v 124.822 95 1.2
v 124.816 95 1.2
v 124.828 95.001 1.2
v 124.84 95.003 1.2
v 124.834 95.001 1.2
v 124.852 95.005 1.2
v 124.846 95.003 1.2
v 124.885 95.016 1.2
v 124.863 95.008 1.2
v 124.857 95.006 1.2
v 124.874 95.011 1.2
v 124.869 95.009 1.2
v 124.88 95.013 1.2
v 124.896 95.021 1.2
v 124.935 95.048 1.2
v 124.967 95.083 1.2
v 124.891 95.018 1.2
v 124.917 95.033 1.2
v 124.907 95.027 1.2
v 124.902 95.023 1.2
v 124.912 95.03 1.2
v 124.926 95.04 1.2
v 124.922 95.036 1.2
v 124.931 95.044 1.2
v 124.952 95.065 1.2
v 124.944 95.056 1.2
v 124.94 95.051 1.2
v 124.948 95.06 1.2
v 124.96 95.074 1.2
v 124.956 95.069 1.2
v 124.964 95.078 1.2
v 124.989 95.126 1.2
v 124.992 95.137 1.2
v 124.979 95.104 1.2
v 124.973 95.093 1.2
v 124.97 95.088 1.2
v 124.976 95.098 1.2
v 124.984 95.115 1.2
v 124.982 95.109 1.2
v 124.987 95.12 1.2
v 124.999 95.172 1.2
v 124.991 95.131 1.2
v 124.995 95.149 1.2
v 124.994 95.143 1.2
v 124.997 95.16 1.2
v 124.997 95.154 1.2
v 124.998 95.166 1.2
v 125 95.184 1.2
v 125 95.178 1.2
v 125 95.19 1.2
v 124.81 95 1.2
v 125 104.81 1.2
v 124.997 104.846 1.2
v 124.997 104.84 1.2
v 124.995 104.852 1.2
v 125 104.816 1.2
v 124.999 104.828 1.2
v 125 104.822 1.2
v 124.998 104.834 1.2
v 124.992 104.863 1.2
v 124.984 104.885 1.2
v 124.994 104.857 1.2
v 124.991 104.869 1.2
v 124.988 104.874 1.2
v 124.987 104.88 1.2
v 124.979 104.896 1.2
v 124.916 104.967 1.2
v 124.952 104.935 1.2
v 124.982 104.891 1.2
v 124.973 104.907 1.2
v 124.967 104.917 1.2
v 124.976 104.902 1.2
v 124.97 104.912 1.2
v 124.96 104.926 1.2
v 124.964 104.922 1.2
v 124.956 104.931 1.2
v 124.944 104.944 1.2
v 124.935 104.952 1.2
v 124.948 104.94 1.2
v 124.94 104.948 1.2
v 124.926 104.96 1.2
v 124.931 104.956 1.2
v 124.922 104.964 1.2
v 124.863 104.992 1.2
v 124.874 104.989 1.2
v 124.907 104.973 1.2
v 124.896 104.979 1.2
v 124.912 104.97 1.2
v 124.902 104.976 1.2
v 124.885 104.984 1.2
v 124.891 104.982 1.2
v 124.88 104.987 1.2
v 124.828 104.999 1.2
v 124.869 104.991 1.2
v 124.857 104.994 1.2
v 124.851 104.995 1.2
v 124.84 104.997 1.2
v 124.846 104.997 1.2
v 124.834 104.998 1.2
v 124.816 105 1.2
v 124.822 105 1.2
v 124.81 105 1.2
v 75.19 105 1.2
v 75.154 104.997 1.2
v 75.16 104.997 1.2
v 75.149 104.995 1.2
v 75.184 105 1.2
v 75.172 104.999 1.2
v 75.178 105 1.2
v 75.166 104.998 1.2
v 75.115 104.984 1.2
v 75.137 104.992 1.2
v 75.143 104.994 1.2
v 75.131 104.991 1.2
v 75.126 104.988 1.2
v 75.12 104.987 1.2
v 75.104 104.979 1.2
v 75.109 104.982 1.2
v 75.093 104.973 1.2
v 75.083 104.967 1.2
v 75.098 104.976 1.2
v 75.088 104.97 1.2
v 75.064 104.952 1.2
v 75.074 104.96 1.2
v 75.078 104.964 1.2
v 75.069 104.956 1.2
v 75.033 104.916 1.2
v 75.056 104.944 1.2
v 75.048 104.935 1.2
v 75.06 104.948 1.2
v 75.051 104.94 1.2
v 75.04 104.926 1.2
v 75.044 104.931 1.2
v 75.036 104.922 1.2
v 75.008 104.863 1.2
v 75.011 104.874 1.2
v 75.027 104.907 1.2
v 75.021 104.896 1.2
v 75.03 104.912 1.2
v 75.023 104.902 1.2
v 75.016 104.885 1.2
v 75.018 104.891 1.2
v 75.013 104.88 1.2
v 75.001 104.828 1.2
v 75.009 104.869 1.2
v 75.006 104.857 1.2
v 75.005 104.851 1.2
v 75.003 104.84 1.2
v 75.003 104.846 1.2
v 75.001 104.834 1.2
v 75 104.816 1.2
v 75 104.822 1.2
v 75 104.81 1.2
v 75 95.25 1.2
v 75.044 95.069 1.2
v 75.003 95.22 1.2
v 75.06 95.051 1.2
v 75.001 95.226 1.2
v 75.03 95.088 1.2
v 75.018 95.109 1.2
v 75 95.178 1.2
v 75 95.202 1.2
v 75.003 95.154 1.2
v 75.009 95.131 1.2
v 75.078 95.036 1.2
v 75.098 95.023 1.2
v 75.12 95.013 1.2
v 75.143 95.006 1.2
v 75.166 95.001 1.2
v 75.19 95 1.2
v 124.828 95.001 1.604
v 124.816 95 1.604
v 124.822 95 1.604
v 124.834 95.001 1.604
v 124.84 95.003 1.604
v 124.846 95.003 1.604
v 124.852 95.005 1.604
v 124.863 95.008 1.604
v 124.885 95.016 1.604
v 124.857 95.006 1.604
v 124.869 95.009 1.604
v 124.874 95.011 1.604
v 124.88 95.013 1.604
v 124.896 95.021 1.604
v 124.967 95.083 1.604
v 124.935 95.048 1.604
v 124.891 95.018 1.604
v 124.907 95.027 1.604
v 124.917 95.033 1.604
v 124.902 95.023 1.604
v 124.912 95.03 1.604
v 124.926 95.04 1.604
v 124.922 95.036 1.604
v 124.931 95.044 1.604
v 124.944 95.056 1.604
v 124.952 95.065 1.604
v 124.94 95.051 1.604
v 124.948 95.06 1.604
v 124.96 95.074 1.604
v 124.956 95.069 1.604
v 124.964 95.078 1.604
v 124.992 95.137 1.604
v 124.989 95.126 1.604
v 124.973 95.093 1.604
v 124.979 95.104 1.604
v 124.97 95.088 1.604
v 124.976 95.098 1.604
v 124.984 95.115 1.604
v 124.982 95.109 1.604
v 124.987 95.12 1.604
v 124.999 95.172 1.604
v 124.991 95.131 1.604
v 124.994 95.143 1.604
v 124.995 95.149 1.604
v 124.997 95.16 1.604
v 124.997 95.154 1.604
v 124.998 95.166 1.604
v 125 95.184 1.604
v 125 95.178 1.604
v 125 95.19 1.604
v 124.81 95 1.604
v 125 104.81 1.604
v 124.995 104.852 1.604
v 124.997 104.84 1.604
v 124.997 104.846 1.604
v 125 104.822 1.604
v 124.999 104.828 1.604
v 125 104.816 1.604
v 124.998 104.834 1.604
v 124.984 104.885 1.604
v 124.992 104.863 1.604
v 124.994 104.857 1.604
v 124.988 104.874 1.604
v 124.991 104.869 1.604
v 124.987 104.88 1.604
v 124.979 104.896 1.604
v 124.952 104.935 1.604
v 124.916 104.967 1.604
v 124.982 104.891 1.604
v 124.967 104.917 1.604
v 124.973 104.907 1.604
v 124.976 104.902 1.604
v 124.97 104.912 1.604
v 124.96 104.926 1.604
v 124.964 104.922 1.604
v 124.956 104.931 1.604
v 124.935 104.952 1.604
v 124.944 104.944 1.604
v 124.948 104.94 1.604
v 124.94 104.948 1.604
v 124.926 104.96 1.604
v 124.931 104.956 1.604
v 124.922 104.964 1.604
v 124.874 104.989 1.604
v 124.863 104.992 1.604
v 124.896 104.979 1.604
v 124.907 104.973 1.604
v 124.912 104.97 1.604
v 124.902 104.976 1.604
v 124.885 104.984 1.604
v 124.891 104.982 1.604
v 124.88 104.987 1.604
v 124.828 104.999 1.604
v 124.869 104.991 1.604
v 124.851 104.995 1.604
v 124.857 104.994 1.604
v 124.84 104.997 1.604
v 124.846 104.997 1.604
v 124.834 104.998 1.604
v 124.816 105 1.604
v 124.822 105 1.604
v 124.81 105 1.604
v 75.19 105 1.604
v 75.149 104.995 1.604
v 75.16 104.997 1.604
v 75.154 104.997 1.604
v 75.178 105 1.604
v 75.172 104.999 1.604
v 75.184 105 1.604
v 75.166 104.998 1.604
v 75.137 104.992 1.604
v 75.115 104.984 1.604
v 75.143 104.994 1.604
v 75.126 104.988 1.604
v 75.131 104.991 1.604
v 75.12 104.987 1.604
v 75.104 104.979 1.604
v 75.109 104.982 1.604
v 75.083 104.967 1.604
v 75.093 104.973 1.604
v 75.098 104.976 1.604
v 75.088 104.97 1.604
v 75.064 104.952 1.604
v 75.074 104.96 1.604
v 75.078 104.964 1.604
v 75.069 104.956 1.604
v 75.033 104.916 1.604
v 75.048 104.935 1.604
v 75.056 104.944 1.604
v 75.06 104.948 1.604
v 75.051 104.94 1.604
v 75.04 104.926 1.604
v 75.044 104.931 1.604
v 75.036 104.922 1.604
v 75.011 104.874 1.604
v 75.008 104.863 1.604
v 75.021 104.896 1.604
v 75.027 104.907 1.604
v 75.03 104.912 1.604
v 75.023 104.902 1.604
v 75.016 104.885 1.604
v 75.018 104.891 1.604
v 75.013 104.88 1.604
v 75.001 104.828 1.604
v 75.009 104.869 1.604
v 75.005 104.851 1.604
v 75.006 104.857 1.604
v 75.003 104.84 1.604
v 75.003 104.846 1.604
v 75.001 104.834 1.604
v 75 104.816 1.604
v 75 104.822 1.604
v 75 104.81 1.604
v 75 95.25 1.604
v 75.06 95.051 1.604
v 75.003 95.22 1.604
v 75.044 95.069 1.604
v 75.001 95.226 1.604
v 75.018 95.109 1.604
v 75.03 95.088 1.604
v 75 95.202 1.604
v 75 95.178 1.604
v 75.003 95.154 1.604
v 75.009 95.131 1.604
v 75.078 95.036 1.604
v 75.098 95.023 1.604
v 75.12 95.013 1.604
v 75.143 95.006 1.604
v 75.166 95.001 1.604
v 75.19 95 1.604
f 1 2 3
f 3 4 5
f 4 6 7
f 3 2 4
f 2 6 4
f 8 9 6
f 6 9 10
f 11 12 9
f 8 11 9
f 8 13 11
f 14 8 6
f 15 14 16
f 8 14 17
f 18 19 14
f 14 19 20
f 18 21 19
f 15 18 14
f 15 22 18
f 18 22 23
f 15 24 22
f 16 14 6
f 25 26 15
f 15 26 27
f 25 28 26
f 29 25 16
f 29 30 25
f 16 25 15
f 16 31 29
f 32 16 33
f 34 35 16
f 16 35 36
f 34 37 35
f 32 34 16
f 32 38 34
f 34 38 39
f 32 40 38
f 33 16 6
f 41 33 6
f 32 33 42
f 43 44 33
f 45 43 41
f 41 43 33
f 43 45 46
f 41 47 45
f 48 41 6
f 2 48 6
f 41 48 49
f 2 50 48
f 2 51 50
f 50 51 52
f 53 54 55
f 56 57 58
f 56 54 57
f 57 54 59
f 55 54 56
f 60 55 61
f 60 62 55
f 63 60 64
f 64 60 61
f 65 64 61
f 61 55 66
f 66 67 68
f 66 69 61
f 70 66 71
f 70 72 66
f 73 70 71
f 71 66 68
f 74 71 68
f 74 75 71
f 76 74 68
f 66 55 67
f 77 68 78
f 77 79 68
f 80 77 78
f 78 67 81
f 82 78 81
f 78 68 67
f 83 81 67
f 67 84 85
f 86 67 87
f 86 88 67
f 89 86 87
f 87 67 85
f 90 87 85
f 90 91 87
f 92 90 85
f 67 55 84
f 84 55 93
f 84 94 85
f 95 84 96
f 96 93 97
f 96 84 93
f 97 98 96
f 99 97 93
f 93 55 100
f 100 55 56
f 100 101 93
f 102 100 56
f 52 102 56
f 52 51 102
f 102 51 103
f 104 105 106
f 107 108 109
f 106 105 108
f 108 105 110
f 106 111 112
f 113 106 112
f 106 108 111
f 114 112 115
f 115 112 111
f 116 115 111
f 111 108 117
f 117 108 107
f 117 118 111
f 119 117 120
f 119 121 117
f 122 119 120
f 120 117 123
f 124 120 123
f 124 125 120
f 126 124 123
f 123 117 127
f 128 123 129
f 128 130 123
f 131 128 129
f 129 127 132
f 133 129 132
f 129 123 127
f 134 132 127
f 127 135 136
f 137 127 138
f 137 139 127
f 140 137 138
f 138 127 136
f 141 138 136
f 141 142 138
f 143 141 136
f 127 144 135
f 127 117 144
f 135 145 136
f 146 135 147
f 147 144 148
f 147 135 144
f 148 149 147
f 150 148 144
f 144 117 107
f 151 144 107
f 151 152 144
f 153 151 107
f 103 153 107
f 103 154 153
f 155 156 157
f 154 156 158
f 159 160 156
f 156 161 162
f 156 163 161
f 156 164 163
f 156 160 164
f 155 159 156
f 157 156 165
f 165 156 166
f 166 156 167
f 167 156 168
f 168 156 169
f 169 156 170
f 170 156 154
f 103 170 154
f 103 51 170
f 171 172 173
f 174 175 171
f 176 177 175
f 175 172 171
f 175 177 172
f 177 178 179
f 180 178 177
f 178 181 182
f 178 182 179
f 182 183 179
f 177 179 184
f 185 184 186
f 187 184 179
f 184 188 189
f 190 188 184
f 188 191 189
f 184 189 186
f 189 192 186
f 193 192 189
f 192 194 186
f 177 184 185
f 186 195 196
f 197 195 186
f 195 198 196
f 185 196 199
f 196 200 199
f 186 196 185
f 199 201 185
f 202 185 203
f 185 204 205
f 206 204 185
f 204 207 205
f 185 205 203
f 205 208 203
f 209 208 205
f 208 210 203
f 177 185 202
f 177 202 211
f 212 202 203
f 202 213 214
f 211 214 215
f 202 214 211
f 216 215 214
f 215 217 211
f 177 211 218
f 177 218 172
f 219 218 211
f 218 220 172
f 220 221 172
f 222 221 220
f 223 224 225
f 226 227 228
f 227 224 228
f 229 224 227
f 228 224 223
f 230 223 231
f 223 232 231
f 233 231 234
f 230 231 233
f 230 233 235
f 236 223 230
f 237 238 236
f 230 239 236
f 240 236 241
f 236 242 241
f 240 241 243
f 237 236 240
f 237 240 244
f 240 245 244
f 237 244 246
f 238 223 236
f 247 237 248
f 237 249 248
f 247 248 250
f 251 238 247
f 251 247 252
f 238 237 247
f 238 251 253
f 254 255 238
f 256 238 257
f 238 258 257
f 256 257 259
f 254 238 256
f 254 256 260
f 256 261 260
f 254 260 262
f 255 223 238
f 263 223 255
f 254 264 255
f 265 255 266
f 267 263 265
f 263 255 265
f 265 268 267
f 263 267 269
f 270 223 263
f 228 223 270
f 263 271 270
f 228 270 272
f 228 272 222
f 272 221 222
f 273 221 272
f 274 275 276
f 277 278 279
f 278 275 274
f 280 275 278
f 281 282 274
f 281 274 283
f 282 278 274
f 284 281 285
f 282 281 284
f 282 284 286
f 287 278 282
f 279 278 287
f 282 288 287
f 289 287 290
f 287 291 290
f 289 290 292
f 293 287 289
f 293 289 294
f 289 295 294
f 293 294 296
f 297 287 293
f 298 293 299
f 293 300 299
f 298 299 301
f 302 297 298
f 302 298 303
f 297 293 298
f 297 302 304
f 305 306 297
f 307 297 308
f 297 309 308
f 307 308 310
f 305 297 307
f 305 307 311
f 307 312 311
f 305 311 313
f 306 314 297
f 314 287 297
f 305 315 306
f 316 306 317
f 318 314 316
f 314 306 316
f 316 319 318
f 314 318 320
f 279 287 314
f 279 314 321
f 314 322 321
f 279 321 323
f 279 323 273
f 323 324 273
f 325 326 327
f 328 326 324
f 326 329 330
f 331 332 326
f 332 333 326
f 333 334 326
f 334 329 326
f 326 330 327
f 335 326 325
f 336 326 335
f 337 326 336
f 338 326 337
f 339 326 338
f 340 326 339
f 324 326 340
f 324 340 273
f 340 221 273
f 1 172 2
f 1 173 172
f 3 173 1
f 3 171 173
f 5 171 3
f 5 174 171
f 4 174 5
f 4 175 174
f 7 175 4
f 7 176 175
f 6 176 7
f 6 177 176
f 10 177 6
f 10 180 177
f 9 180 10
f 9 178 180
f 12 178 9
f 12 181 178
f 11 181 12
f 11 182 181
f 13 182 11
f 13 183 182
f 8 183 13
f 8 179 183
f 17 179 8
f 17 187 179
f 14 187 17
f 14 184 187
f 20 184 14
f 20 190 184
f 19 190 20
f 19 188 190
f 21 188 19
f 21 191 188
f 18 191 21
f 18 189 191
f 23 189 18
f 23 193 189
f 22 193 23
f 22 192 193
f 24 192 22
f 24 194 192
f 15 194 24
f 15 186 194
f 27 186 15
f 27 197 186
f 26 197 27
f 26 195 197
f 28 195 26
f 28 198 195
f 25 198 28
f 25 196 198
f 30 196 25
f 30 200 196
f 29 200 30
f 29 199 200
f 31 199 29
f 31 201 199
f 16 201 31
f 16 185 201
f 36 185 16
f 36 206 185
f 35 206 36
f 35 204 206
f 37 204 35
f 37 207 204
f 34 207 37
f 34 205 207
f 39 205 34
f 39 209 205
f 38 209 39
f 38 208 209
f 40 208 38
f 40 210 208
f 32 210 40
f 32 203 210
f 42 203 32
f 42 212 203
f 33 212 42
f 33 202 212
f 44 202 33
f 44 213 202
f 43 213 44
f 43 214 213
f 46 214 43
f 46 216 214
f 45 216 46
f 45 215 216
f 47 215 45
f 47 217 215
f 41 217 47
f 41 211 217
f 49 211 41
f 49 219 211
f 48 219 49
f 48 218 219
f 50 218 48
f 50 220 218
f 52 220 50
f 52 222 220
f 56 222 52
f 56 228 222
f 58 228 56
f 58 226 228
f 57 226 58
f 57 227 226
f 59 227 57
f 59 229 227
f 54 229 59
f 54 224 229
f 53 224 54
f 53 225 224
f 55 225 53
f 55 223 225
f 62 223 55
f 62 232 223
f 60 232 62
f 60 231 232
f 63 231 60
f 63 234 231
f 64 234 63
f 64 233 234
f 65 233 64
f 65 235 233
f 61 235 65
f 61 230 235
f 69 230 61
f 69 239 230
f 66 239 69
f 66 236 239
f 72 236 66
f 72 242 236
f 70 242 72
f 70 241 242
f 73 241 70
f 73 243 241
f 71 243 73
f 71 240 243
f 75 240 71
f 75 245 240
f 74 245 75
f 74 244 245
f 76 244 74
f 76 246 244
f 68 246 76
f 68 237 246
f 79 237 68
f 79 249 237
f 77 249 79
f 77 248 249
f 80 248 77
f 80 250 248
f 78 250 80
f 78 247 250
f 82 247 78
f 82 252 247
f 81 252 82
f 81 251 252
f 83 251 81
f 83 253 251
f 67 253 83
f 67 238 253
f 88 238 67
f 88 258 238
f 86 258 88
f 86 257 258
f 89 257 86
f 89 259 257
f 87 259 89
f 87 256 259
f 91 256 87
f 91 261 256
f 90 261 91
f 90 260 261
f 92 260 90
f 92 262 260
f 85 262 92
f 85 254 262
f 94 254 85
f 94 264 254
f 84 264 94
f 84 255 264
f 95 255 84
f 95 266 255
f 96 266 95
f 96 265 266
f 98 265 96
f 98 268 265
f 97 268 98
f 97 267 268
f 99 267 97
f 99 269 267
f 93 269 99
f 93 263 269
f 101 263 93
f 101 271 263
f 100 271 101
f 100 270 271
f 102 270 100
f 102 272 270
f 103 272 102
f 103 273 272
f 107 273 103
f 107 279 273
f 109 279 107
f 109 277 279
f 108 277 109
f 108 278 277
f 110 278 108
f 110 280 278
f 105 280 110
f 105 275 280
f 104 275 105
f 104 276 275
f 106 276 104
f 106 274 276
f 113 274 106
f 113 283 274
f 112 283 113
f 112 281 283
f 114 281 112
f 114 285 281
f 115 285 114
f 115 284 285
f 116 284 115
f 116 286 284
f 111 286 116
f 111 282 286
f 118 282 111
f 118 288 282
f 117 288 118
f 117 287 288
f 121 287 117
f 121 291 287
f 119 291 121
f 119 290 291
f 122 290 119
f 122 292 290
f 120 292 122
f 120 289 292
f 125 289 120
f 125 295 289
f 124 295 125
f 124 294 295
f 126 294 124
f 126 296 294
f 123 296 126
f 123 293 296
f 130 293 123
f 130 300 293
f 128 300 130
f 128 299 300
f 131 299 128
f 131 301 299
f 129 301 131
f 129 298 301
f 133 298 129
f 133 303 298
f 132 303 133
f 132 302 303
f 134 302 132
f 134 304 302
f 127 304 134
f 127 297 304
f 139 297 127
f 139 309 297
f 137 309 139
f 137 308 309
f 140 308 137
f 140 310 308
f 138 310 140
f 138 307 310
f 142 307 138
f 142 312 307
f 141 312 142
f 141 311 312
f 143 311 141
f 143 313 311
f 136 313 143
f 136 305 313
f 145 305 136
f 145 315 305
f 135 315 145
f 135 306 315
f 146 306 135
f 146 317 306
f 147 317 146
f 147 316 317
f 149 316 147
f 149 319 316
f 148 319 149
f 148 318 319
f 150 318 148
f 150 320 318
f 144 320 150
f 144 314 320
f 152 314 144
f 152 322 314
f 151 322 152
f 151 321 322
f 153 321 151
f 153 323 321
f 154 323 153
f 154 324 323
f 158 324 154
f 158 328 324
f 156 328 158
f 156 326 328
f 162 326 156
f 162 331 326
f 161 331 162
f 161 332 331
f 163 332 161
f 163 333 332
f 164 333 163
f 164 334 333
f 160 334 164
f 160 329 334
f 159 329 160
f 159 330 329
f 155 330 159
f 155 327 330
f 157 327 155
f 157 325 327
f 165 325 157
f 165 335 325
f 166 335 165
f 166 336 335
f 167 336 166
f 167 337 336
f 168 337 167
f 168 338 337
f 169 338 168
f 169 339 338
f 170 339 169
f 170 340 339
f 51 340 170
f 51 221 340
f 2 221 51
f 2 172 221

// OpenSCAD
module drawBasicShape(x1, y1, x2, y2, width)
{
	length = sqrt((x1-x2)*(x1-x2) + (y1-y2)*(y1-y2));
	if (width!=0.0) {
		square(size = [width, length], center = false);
		translate([width/2.0, 0, 0]) circle(d=width);
		translate([width/2.0, length, 0]) circle(d=width);
	}
}

module translateAndRotate(x1, y1, x2, y2, width)
{
	if (width != 0.0) {
		angle = atan((y2-y1)/(x2-x1)) +270;
		if (x2>=x1) {
			translate([x1, y1, 0.0]) rotate([0.0, 0.0, angle]) translate([-width/2.0, 0.0, 0.0]) scale([1.0, 1.0, 1.0]) drawBasicShape(x1, y1, x2, y2, width);
		}
		else {
			translate([x1, y1, 0.0]) rotate([0.0, 0.0, angle+180]) translate([-width/2.0, 0.0, 0.0]) scale([1.0, 1.0, 1.0]) drawBasicShape(x1, y1, x2, y2, width);		}
	}
}

$fn=50;

points2 = [
[75.77800000, 95.77800000, 0.00000000],
[124.22200000, 95.77800000, 0.37999672],
[124.22200000, 104.22200000, 0.37997788],
[75.77800000, 104.22200000, 0.37999548],
[75.77800000, 95.83800000, 0.37998140],
[75.48400000, 95.48400000, 0.00000000],
[124.51600000, 95.48400000, 0.37999746],
[124.51600000, 104.51600000, 0.37998977],
[75.48400000, 104.51600000, 0.37999868],
[75.48400000, 95.54400000, 0.37998644],
[75.19000000, 95.19000000, 0.00000000],
[124.81000000, 95.19000000, 0.37999939],
[124.81000000, 104.81000000, 0.38000021],
[75.19000000, 104.81000000, 0.38000060],
[75.19000000, 95.25000000, 0.37999715],
[75.53600000, 95.39000000, 0.00000000],
[75.94600000, 103.88900000, 0.00000000],
[76.11100000, 104.05400000, 0.38038683],
[76.52800000, 104.05400000, 0.38087711],
[75.94600000, 103.47200000, 0.38062992],
[75.94600000, 103.05500000, 0.38073291],
[76.94500000, 104.05400000, 0.38071263],
[77.36200000, 104.05400000, 0.38087711],
[75.94600000, 102.63800000, 0.38074663],
[75.94600000, 102.22100000, 0.38073291],
[77.77900000, 104.05400000, 0.38074196],
[78.19600000, 104.05400000, 0.38087711],
[75.94600000, 101.80400000, 0.38075792],
[75.94600000, 101.38700000, 0.38073291],
[78.61300000, 104.05400000, 0.38076888],
[79.03000000, 104.05400000, 0.38087711],
[75.94600000, 100.97000000, 0.38076310],
[75.94600000, 100.55300000, 0.38087711],
[79.44700000, 104.05400000, 0.38077084],
[79.86400000, 104.05400000, 0.38073291],
[75.94600000, 100.13600000, 0.38077693],
[75.94600000, 99.71900000, 0.38087711],
[80.28100000, 104.05400000, 0.38077204],
[80.69800000, 104.05400000, 0.38087711],
[75.94600000, 99.30200000, 0.38077696],
[75.94600000, 98.88500000, 0.38073291],
[81.11500000, 104.05400000, 0.38078108],
[81.53300000, 104.05400000, 0.38017128],
[75.94600000, 98.46700000, 0.38072419],
[75.94600000, 98.05000000, 0.38087711],
[81.95000000, 104.05400000, 0.38073140],
[82.36700000, 104.05400000, 0.38073291],
[75.94600000, 97.63300000, 0.38073768],
[75.94600000, 97.21600000, 0.38087711],
[82.78400000, 104.05400000, 0.38074319],
[83.20100000, 104.05400000, 0.38073291],
[75.94600000, 96.79900000, 0.38074221],
[75.94600000, 96.38200000, 0.38087711],
[83.61800000, 104.05400000, 0.38074688],
[84.03500000, 104.05400000, 0.38073291],
[75.95600000, 95.97600000, 0.38075541],
[76.34400000, 95.94600000, 0.38035263],
[84.45200000, 104.05400000, 0.38075221],
[84.86900000, 104.05400000, 0.38087711],
[76.76100000, 95.94600000, 0.38075221],
[77.17800000, 95.94600000, 0.38087711],
[85.28600000, 104.05400000, 0.38075221],
[85.70300000, 104.05400000, 0.38087711],
[77.59500000, 95.94600000, 0.38075221],
[78.01200000, 95.94600000, 0.38087711],
[86.12000000, 104.05400000, 0.38075221],
[86.53700000, 104.05400000, 0.38087711],
[78.42900000, 95.94600000, 0.38075221],
[78.84600000, 95.94600000, 0.38087711],
[86.95400000, 104.05400000, 0.38075221],
[87.37100000, 104.05400000, 0.38087711],
[79.26300000, 95.94600000, 0.38075221],
[79.68000000, 95.94600000, 0.38087711],
[87.78900000, 104.05400000, 0.38073402],
[88.20600000, 104.05400000, 0.38087711],
[80.09700000, 95.94600000, 0.38073402],
[80.51400000, 95.94600000, 0.38087711],
[88.62300000, 104.05400000, 0.38073402],
[89.04000000, 104.05400000, 0.38087711],
[80.93200000, 95.94600000, 0.38075221],
[81.34900000, 95.94600000, 0.38087711],
[89.45700000, 104.05400000, 0.38075221],
[89.87400000, 104.05400000, 0.38087711],
[81.76600000, 95.94600000, 0.38075221],
[82.18300000, 95.94600000, 0.38087711],
[90.29100000, 104.05400000, 0.38075221],
[90.70800000, 104.05400000, 0.38087711],
[82.60000000, 95.94600000, 0.38075221],
[83.01700000, 95.94600000, 0.38087711],
[91.12500000, 104.05400000, 0.38075221],
[91.54200000, 104.05400000, 0.38087711],
[83.43400000, 95.94600000, 0.38075221],
[83.85100000, 95.94600000, 0.38087711],
[91.95900000, 104.05400000, 0.38075221],
[92.37600000, 104.05400000, 0.38087711],
[84.26800000, 95.94600000, 0.38075221],
[84.68500000, 95.94600000, 0.38087711],
[92.79300000, 104.05400000, 0.38075221],
[93.21000000, 104.05400000, 0.38087711],
[85.10200000, 95.94600000, 0.38075221],
[85.51900000, 95.94600000, 0.38087711],
[93.62700000, 104.05400000, 0.38075221],
[94.04400000, 104.05400000, 0.38087711],
[85.93600000, 95.94600000, 0.38075221],
[86.35300000, 95.94600000, 0.38087711],
[94.46200000, 104.05400000, 0.38073402],
[94.87900000, 104.05400000, 0.38087711],
[86.77000000, 95.94600000, 0.38073402],
[87.18800000, 95.94600000, 0.38017128],
[95.29600000, 104.05400000, 0.38075745],
[95.71300000, 104.05400000, 0.38073291],
[87.60500000, 95.94600000, 0.38075745],
[88.02200000, 95.94600000, 0.38073291],
[96.13000000, 104.05400000, 0.38075745],
[96.54700000, 104.05400000, 0.38073291],
[88.43900000, 95.94600000, 0.38075745],
[88.85600000, 95.94600000, 0.38073291],
[96.96400000, 104.05400000, 0.38075745],
[97.38100000, 104.05400000, 0.38073291],
[89.27300000, 95.94600000, 0.38075745],
[89.69000000, 95.94600000, 0.38073291],
[97.79800000, 104.05400000, 0.38075745],
[98.21500000, 104.05400000, 0.38073291],
[90.10700000, 95.94600000, 0.38075745],
[90.52400000, 95.94600000, 0.38073291],
[98.63200000, 104.05400000, 0.38075745],
[99.04900000, 104.05400000, 0.38073291],
[90.94100000, 95.94600000, 0.38075745],
[91.35800000, 95.94600000, 0.38073291],
[99.46600000, 104.05400000, 0.38075745],
[99.88300000, 104.05400000, 0.38073291],
[91.77500000, 95.94600000, 0.38075745],
[92.19200000, 95.94600000, 0.38073291],
[100.30000000, 104.05400000, 0.38075745],
[100.71800000, 104.05400000, 0.38002742],
[92.60900000, 95.94600000, 0.38073927],
[93.02600000, 95.94600000, 0.38073291],
[101.13500000, 104.05400000, 0.38073927],
[101.55200000, 104.05400000, 0.38073291],
[93.44400000, 95.94600000, 0.38075745],
[93.86100000, 95.94600000, 0.38073291],
[101.96900000, 104.05400000, 0.38075745],
[102.38600000, 104.05400000, 0.38073291],
[94.27800000, 95.94600000, 0.38075745],
[94.69500000, 95.94600000, 0.38073291],
[102.80300000, 104.05400000, 0.38075745],
[103.22000000, 104.05400000, 0.38073291],
[95.11200000, 95.94600000, 0.38075745],
[95.52900000, 95.94600000, 0.38073291],
[103.63700000, 104.05400000, 0.38075745],
[104.05400000, 104.05400000, 0.38073291],
[95.94600000, 95.94600000, 0.38075745],
[96.36300000, 95.94600000, 0.38073291],
[104.47100000, 104.05400000, 0.38075745],
[104.88800000, 104.05400000, 0.38073291],
[96.78000000, 95.94600000, 0.38075745],
[97.19700000, 95.94600000, 0.38073291],
[105.30500000, 104.05400000, 0.38075745],
[105.72200000, 104.05400000, 0.38073291],
[97.61400000, 95.94600000, 0.38075745],
[98.03100000, 95.94600000, 0.38073291],
[106.13900000, 104.05400000, 0.38075745],
[106.55600000, 104.05400000, 0.38073291],
[98.44800000, 95.94600000, 0.38075745],
[98.86500000, 95.94600000, 0.38073291],
[106.97300000, 104.05400000, 0.38075745],
[107.39100000, 104.05400000, 0.38002742],
[99.28200000, 95.94600000, 0.38073927],
[99.69900000, 95.94600000, 0.38073291],
[107.80800000, 104.05400000, 0.38073927],
[108.22500000, 104.05400000, 0.38073291],
[100.11700000, 95.94600000, 0.38075745],
[100.53400000, 95.94600000, 0.38073291],
[108.64200000, 104.05400000, 0.38075745],
[109.05900000, 104.05400000, 0.38073291],
[100.95100000, 95.94600000, 0.38075745],
[101.36800000, 95.94600000, 0.38073291],
[109.47600000, 104.05400000, 0.38075745],
[109.89300000, 104.05400000, 0.38073291],
[101.78500000, 95.94600000, 0.38075745],
[102.20200000, 95.94600000, 0.38073291],
[110.31000000, 104.05400000, 0.38075745],
[110.72700000, 104.05400000, 0.38073291],
[102.61900000, 95.94600000, 0.38075745],
[103.03600000, 95.94600000, 0.38073291],
[111.14400000, 104.05400000, 0.38075745],
[111.56100000, 104.05400000, 0.38073291],
[103.45300000, 95.94600000, 0.38075745],
[103.87000000, 95.94600000, 0.38073291],
[111.97800000, 104.05400000, 0.38075745],
[112.39500000, 104.05400000, 0.38073291],
[104.28700000, 95.94600000, 0.38075745],
[104.70400000, 95.94600000, 0.38073291],
[112.81200000, 104.05400000, 0.38075745],
[113.22900000, 104.05400000, 0.38073291],
[105.12100000, 95.94600000, 0.38075745],
[105.53800000, 95.94600000, 0.38073291],
[113.64700000, 104.05400000, 0.38073927],
[114.06400000, 104.05400000, 0.38073291],
[105.95500000, 95.94600000, 0.38073927],
[106.37300000, 95.94600000, 0.38002742],
[114.48100000, 104.05400000, 0.38075745],
[114.89800000, 104.05400000, 0.38073291],
[106.79000000, 95.94600000, 0.38075745],
[107.20700000, 95.94600000, 0.38073291],
[115.31500000, 104.05400000, 0.38075745],
[115.73200000, 104.05400000, 0.38073291],
[107.62400000, 95.94600000, 0.38075745],
[108.04100000, 95.94600000, 0.38073291],
[116.14900000, 104.05400000, 0.38075745],
[116.56600000, 104.05400000, 0.38073291],
[108.45800000, 95.94600000, 0.38075745],
[108.87500000, 95.94600000, 0.38073291],
[116.98300000, 104.05400000, 0.38075745],
[117.40000000, 104.05400000, 0.38073291],
[109.29200000, 95.94600000, 0.38075745],
[109.70900000, 95.94600000, 0.38073291],
[117.81700000, 104.05400000, 0.38075745],
[118.23400000, 104.05400000, 0.38073291],
[110.12600000, 95.94600000, 0.38075745],
[110.54300000, 95.94600000, 0.38073291],
[118.65100000, 104.05400000, 0.38075745],
[119.06800000, 104.05400000, 0.38073291],
[110.96000000, 95.94600000, 0.38075745],
[111.37700000, 95.94600000, 0.38073291],
[119.48500000, 104.05400000, 0.38075745],
[119.90300000, 104.05400000, 0.38002742],
[111.79400000, 95.94600000, 0.38073927],
[112.21100000, 95.94600000, 0.38073291],
[120.32000000, 104.05400000, 0.38073927],
[120.73700000, 104.05400000, 0.38073291],
[112.62900000, 95.94600000, 0.38075745],
[113.04600000, 95.94600000, 0.38073291],
[121.15400000, 104.05400000, 0.38075745],
[121.57100000, 104.05400000, 0.38073291],
[113.46300000, 95.94600000, 0.38075745],
[113.88000000, 95.94600000, 0.38073291],
[121.98800000, 104.05400000, 0.38075745],
[122.40500000, 104.05400000, 0.38073291],
[114.29700000, 95.94600000, 0.38075745],
[114.71400000, 95.94600000, 0.38073291],
[122.82200000, 104.05400000, 0.38075745],
[123.23900000, 104.05400000, 0.38073291],
[115.13100000, 95.94600000, 0.38075745],
[115.54800000, 95.94600000, 0.38073291],
[123.65600000, 104.05400000, 0.38075745],
[124.04400000, 104.02500000, 0.38041002],
[115.96500000, 95.94600000, 0.38073716],
[116.38200000, 95.94600000, 0.38073291],
[124.05400000, 103.61800000, 0.38074688],
[124.05400000, 103.20100000, 0.38087711],
[116.79900000, 95.94600000, 0.38074807],
[117.21600000, 95.94600000, 0.38073291],
[124.05400000, 102.78400000, 0.38074319],
[124.05400000, 102.36700000, 0.38087711],
[117.63300000, 95.94600000, 0.38073768],
[118.05000000, 95.94600000, 0.38073291],
[124.05400000, 101.95000000, 0.38073848],
[124.05400000, 101.53300000, 0.38087711],
[118.46700000, 95.94600000, 0.38072419],
[118.88400000, 95.94600000, 0.38087711],
[124.05400000, 101.11600000, 0.38072403],
[124.05400000, 100.69800000, 0.38017128],
[119.30200000, 95.94600000, 0.38077696],
[119.71900000, 95.94600000, 0.38087711],
[124.05400000, 100.28100000, 0.38078185],
[124.05400000, 99.86400000, 0.38073291],
[120.13600000, 95.94600000, 0.38077693],
[120.55300000, 95.94600000, 0.38087711],
[124.05400000, 99.44700000, 0.38077084],
[124.05400000, 99.03000000, 0.38087711],
[120.97000000, 95.94600000, 0.38077689],
[121.38700000, 95.94600000, 0.38073291],
[124.05400000, 98.61300000, 0.38076888],
[124.05400000, 98.19600000, 0.38087711],
[121.80400000, 95.94600000, 0.38075792],
[122.22100000, 95.94600000, 0.38087711],
[124.05400000, 97.77900000, 0.38074196],
[124.05400000, 97.36200000, 0.38087711],
[122.63800000, 95.94600000, 0.38074663],
[123.05500000, 95.94600000, 0.38073291],
[124.05400000, 96.94500000, 0.38075519],
[124.05400000, 96.52800000, 0.38073291],
[123.47200000, 95.94600000, 0.38070298],
[123.88900000, 95.94600000, 0.38073291],
[124.05400000, 96.11100000, 0.38038683],
];

translate([0.0, 0.0, 1.20000000]) {
	linear_extrude(height = 0.40400000, center = false, convexity = 10, twist = 0) {
		union() {
			for( i=[0:len(points2)-2] ){ 
				x1 = points2[i][0];
				y1 = points2[i][1];
				x2 = points2[i+1][0];
				y2 = points2[i+1][1];
				width = points2[i+1][2];
				translateAndRotate(x1, y1, x2, y2, width);
			}
		}
	}
}
